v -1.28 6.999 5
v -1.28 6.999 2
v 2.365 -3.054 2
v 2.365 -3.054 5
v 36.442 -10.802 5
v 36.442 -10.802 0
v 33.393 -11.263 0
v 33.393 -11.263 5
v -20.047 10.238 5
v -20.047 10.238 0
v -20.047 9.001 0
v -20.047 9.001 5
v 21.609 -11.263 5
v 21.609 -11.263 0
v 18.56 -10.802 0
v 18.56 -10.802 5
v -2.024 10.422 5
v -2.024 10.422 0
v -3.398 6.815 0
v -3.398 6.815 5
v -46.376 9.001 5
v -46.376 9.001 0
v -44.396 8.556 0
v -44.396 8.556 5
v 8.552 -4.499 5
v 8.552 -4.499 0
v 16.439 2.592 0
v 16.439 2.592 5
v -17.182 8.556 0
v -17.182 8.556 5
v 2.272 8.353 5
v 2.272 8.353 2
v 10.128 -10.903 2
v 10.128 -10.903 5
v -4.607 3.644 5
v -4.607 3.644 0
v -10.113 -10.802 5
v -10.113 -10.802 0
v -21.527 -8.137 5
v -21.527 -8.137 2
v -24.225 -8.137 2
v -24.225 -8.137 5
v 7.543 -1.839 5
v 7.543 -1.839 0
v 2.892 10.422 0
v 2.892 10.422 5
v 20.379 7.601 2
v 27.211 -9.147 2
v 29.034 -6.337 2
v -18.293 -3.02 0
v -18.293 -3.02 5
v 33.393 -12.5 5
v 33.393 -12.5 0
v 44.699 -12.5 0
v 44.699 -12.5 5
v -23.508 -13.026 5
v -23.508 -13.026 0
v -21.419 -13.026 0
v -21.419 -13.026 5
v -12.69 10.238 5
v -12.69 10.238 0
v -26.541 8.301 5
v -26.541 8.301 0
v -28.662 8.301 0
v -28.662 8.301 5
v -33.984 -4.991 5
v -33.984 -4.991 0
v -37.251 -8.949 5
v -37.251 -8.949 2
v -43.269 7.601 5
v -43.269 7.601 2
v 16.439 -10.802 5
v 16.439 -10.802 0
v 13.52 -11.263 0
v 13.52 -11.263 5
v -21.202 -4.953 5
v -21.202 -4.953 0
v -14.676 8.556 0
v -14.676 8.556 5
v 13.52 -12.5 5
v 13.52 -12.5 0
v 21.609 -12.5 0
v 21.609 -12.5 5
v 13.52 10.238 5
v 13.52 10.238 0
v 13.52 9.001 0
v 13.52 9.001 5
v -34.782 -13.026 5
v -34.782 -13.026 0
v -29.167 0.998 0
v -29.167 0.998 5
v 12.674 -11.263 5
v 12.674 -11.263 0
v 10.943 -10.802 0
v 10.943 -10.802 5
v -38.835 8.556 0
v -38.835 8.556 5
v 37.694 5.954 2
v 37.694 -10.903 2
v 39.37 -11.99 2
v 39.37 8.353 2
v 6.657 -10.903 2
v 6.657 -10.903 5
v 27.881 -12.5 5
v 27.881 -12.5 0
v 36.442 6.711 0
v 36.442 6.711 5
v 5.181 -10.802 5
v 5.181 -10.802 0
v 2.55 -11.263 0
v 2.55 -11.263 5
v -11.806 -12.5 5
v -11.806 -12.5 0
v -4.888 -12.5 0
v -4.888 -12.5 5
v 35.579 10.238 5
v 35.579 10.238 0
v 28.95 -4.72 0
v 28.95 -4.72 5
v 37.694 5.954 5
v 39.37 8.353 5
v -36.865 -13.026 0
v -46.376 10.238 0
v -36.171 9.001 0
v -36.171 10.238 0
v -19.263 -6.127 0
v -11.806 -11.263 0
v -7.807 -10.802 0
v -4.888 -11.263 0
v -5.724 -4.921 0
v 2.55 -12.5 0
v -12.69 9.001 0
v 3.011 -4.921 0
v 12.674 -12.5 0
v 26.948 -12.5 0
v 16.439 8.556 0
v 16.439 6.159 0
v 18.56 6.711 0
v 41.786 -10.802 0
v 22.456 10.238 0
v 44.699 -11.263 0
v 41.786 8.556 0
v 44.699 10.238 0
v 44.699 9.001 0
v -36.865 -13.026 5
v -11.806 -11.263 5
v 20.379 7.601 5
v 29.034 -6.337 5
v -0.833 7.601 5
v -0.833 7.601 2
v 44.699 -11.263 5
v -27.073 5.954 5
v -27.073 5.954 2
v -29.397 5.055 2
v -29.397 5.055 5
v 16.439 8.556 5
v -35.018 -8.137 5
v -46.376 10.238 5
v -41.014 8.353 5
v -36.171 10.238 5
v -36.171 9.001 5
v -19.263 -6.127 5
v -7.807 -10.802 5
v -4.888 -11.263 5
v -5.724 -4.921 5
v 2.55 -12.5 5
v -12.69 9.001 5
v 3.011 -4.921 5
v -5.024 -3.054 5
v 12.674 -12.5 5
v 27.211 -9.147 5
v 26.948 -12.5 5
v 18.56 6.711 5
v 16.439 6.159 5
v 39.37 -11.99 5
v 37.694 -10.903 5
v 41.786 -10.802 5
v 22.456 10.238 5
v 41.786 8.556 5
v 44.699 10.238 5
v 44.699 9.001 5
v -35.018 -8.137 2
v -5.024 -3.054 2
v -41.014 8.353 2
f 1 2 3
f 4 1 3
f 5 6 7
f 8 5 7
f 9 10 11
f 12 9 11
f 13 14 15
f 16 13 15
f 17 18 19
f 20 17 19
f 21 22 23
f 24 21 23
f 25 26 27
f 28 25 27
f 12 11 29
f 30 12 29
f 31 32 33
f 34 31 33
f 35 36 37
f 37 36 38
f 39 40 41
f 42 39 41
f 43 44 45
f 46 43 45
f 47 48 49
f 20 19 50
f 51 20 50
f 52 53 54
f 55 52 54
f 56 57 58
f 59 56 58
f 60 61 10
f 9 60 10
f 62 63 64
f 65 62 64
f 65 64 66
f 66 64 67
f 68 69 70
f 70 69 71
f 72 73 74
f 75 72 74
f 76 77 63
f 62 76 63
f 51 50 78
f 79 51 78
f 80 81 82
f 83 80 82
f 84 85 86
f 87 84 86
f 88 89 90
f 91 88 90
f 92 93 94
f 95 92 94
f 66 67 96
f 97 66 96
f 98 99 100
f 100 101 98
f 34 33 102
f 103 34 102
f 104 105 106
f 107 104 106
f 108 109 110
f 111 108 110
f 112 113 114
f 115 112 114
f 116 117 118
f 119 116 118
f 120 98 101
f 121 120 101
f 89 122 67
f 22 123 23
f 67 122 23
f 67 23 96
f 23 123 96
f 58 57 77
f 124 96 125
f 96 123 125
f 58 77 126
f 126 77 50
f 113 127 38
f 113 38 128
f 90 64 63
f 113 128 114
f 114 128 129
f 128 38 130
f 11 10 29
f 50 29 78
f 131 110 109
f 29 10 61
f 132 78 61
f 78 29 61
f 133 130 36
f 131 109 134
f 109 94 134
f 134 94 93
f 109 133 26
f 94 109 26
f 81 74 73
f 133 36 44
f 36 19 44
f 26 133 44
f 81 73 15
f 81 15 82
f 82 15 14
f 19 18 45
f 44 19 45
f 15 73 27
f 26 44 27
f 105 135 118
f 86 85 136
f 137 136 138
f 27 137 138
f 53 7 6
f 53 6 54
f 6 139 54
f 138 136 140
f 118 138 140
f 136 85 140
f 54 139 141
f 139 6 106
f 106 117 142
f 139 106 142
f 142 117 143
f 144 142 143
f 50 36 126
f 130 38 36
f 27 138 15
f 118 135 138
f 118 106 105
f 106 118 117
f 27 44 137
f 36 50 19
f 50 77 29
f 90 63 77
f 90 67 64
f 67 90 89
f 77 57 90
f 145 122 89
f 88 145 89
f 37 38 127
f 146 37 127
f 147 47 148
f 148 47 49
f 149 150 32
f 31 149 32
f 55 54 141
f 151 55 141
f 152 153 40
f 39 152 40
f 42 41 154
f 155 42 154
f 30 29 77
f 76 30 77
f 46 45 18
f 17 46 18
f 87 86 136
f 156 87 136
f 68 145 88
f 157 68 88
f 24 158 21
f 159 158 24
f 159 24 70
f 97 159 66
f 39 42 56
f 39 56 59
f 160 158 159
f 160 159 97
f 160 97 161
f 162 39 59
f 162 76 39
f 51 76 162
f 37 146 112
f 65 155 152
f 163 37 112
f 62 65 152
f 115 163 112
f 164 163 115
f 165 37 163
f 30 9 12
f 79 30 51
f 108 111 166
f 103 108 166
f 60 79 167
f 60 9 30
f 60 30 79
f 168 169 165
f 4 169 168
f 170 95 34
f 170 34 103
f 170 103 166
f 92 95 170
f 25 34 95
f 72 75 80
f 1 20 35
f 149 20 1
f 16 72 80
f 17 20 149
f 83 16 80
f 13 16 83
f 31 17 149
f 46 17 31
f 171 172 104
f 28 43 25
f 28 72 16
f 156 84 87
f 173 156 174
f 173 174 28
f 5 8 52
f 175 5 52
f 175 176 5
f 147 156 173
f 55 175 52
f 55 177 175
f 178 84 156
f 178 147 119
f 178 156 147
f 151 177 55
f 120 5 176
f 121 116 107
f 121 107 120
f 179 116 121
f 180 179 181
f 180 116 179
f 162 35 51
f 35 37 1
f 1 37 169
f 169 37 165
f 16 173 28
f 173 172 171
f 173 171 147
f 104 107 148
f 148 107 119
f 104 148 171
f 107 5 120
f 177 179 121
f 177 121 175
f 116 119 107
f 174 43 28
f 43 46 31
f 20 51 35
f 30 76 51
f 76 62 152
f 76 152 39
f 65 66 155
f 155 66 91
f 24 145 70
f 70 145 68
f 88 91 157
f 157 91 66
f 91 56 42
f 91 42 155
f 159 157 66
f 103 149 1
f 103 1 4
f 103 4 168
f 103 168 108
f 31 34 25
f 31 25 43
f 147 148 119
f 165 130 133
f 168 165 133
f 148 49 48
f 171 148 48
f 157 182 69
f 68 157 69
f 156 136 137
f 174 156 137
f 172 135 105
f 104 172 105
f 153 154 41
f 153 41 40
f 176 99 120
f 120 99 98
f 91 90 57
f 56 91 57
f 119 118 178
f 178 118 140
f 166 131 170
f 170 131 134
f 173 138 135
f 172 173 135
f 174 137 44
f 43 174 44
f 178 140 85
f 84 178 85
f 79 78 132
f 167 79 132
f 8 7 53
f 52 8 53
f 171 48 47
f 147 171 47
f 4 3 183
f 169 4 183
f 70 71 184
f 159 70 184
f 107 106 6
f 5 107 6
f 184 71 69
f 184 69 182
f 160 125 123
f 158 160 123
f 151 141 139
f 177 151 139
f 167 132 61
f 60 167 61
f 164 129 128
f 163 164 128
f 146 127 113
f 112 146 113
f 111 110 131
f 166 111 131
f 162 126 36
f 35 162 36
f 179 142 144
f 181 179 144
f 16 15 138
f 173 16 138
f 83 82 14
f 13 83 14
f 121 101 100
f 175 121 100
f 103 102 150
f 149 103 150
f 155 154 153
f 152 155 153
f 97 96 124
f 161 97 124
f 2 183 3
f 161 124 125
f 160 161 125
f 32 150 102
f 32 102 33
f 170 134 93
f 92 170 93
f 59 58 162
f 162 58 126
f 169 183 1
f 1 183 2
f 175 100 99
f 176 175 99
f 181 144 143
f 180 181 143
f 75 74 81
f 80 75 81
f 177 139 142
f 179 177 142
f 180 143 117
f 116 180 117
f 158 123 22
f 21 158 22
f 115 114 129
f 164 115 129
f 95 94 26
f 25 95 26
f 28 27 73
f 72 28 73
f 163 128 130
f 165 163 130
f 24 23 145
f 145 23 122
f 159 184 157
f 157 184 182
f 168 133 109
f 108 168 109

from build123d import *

# Parameters (mm, degrees)
F1_DEPTH = 5
F2_DEPTH = 2


with BuildPart() as f1:
    # F0 (on Top) → F1 (new body)
    with BuildSketch(Plane.XY):
        Polygon((-19.2634474565, -6.1269301263), (-18.2925394874, -3.0197121847), (-14.6755642361, 8.5557725694), (-12.6898871528, 9.0006510417), (-12.6898871528, 10.2376302083), (-20.0466579861, 10.2376302083), (-20.0466579861, 9.0006510417), (-17.1820746528, 8.5557725694), (-21.2022569444, -4.9533420139), (-26.5407986111, 8.30078125), (-28.662109375, 8.30078125), (-33.984375, -4.9913194444), (-38.8346354167, 8.5557725694), (-36.1707899306, 9.0006510417), (-36.1707899306, 10.2376302083), (-46.3758680556, 10.2376302083), (-46.3758680556, 9.0006510417), (-44.3956163194, 8.5557725694), (-36.865234375, -13.0262586806), (-34.7819010417, -13.0262586806), (-29.1666666667, 0.9982638889), (-23.5080295139, -13.0262586806), (-21.4192708333, -13.0262586806), align=None)
        Polygon((-43.2690681627, 7.6009020128), (-41.0144999623, 8.3526074886), (-35.0183658302, -8.1367557868), (-37.251050357, -8.9486413444), align=None, mode=Mode.SUBTRACT)
        Polygon((-29.3969921768, 5.0547351129), (-27.0734913647, 5.9541547671), (-21.5270686895, -8.1367557868), (-24.2253281176, -8.1367557868), align=None, mode=Mode.SUBTRACT)
        Polygon((-4.6070118818, 3.644027612), (-3.3984823364, 6.814897888), (-18.2925394874, -3.0197121847), (-19.2634474565, -6.1269301263), align=None)
        Polygon((-2.0236545139, 10.4220920139), (-3.3984823364, 6.814897888), (-4.6070118818, 3.644027612), (-10.1128472222, -10.8018663194), (-11.8055555556, -11.2630208333), (-11.8055555556, -12.5), (-4.8882378472, -12.5), (-4.8882378472, -11.2630208333), (-7.8070746528, -10.8018663194), (-5.7237413194, -4.9207899306), (3.0110677083, -4.9207899306), (5.1812065972, -10.8018663194), (2.5499131944, -11.2630208333), (2.5499131944, -12.5), (12.6736111111, -12.5), (12.6736111111, -11.2630208333), (10.9429253472, -10.8018663194), (8.5519227834, -4.4988999923), (7.5429662144, -1.8391708158), (2.8917100694, 10.4220920139), align=None)
        Polygon((-5.0238715278, -3.0544704861), (-1.2803819444, 6.9986979167), (2.3654513889, -3.0544704861), align=None, mode=Mode.SUBTRACT)
        Polygon((-0.8333516307, 7.6009020128), (2.2724873852, 8.3526074886), (10.1284366101, -10.9029943123), (6.6572050564, -10.9029943123), align=None, mode=Mode.SUBTRACT)
        Polygon((16.4388020833, 6.1594187407), (7.5429662144, -1.8391708158), (8.5519227834, -4.4988999923), (16.4388020833, 2.5924977505), align=None)
        Polygon((16.4388020833, 8.5557725694), (16.4388020833, 6.1594187407), (16.4388020833, 2.5924977505), (16.4388020833, -10.8018663194), (13.5199652778, -11.2630208333), (13.5199652778, -12.5), (21.6091579861, -12.5), (21.6091579861, -11.2630208333), (18.5601128472, -10.8018663194), (18.5601128472, 6.7111545139), (26.9476996528, -12.5), (27.880859375, -12.5), (36.4420572917, 6.7111545139), (36.4420572917, -10.8018663194), (33.3930121528, -11.2630208333), (33.3930121528, -12.5), (44.6994357639, -12.5), (44.6994357639, -11.2630208333), (41.7860243056, -10.8018663194), (41.7860243056, 8.5557725694), (44.6994357639, 9.0006510417), (44.6994357639, 10.2376302083), (35.5794270833, 10.2376302083), (28.9496527778, -4.7200520833), (22.4555121528, 10.2376302083), (13.5199652778, 10.2376302083), (13.5199652778, 9.0006510417), align=None)
        Polygon((37.6935936511, -10.9029943123), (37.6935936511, 5.9541547671), (39.3697134069, 8.3526074886), (39.3697134069, -11.9900868907), align=None, mode=Mode.SUBTRACT)
        Polygon((27.211471604, -9.1471979388), (20.3785393387, 7.6009020128), (29.0340669453, -6.3370526768), align=None, mode=Mode.SUBTRACT)
    extrude(amount=F1_DEPTH)

    # F0 (on Top) → F2 (join)
    with BuildSketch(Plane.XY):
        Polygon((-21.5270686895, -8.1367557868), (-27.0734913647, 5.9541547671), (-29.3969921768, 5.0547351129), (-24.2253281176, -8.1367557868), align=None)
        Polygon((-35.0183658302, -8.1367557868), (-41.0144999623, 8.3526074886), (-43.2690681627, 7.6009020128), (-37.251050357, -8.9486413444), align=None)
        Polygon((10.1284366101, -10.9029943123), (2.2724873852, 8.3526074886), (-0.8333516307, 7.6009020128), (6.6572050564, -10.9029943123), align=None)
        Polygon((2.3654513889, -3.0544704861), (-1.2803819444, 6.9986979167), (-5.0238715278, -3.0544704861), align=None)
        Polygon((29.0340669453, -6.3370526768), (20.3785393387, 7.6009020128), (27.211471604, -9.1471979388), align=None)
        Polygon((39.3697134069, 8.3526074886), (37.6935936511, 5.9541547671), (37.6935936511, -10.9029943123), (39.3697134069, -11.9900868907), align=None)
    extrude(amount=F2_DEPTH)


solid = f1.part
